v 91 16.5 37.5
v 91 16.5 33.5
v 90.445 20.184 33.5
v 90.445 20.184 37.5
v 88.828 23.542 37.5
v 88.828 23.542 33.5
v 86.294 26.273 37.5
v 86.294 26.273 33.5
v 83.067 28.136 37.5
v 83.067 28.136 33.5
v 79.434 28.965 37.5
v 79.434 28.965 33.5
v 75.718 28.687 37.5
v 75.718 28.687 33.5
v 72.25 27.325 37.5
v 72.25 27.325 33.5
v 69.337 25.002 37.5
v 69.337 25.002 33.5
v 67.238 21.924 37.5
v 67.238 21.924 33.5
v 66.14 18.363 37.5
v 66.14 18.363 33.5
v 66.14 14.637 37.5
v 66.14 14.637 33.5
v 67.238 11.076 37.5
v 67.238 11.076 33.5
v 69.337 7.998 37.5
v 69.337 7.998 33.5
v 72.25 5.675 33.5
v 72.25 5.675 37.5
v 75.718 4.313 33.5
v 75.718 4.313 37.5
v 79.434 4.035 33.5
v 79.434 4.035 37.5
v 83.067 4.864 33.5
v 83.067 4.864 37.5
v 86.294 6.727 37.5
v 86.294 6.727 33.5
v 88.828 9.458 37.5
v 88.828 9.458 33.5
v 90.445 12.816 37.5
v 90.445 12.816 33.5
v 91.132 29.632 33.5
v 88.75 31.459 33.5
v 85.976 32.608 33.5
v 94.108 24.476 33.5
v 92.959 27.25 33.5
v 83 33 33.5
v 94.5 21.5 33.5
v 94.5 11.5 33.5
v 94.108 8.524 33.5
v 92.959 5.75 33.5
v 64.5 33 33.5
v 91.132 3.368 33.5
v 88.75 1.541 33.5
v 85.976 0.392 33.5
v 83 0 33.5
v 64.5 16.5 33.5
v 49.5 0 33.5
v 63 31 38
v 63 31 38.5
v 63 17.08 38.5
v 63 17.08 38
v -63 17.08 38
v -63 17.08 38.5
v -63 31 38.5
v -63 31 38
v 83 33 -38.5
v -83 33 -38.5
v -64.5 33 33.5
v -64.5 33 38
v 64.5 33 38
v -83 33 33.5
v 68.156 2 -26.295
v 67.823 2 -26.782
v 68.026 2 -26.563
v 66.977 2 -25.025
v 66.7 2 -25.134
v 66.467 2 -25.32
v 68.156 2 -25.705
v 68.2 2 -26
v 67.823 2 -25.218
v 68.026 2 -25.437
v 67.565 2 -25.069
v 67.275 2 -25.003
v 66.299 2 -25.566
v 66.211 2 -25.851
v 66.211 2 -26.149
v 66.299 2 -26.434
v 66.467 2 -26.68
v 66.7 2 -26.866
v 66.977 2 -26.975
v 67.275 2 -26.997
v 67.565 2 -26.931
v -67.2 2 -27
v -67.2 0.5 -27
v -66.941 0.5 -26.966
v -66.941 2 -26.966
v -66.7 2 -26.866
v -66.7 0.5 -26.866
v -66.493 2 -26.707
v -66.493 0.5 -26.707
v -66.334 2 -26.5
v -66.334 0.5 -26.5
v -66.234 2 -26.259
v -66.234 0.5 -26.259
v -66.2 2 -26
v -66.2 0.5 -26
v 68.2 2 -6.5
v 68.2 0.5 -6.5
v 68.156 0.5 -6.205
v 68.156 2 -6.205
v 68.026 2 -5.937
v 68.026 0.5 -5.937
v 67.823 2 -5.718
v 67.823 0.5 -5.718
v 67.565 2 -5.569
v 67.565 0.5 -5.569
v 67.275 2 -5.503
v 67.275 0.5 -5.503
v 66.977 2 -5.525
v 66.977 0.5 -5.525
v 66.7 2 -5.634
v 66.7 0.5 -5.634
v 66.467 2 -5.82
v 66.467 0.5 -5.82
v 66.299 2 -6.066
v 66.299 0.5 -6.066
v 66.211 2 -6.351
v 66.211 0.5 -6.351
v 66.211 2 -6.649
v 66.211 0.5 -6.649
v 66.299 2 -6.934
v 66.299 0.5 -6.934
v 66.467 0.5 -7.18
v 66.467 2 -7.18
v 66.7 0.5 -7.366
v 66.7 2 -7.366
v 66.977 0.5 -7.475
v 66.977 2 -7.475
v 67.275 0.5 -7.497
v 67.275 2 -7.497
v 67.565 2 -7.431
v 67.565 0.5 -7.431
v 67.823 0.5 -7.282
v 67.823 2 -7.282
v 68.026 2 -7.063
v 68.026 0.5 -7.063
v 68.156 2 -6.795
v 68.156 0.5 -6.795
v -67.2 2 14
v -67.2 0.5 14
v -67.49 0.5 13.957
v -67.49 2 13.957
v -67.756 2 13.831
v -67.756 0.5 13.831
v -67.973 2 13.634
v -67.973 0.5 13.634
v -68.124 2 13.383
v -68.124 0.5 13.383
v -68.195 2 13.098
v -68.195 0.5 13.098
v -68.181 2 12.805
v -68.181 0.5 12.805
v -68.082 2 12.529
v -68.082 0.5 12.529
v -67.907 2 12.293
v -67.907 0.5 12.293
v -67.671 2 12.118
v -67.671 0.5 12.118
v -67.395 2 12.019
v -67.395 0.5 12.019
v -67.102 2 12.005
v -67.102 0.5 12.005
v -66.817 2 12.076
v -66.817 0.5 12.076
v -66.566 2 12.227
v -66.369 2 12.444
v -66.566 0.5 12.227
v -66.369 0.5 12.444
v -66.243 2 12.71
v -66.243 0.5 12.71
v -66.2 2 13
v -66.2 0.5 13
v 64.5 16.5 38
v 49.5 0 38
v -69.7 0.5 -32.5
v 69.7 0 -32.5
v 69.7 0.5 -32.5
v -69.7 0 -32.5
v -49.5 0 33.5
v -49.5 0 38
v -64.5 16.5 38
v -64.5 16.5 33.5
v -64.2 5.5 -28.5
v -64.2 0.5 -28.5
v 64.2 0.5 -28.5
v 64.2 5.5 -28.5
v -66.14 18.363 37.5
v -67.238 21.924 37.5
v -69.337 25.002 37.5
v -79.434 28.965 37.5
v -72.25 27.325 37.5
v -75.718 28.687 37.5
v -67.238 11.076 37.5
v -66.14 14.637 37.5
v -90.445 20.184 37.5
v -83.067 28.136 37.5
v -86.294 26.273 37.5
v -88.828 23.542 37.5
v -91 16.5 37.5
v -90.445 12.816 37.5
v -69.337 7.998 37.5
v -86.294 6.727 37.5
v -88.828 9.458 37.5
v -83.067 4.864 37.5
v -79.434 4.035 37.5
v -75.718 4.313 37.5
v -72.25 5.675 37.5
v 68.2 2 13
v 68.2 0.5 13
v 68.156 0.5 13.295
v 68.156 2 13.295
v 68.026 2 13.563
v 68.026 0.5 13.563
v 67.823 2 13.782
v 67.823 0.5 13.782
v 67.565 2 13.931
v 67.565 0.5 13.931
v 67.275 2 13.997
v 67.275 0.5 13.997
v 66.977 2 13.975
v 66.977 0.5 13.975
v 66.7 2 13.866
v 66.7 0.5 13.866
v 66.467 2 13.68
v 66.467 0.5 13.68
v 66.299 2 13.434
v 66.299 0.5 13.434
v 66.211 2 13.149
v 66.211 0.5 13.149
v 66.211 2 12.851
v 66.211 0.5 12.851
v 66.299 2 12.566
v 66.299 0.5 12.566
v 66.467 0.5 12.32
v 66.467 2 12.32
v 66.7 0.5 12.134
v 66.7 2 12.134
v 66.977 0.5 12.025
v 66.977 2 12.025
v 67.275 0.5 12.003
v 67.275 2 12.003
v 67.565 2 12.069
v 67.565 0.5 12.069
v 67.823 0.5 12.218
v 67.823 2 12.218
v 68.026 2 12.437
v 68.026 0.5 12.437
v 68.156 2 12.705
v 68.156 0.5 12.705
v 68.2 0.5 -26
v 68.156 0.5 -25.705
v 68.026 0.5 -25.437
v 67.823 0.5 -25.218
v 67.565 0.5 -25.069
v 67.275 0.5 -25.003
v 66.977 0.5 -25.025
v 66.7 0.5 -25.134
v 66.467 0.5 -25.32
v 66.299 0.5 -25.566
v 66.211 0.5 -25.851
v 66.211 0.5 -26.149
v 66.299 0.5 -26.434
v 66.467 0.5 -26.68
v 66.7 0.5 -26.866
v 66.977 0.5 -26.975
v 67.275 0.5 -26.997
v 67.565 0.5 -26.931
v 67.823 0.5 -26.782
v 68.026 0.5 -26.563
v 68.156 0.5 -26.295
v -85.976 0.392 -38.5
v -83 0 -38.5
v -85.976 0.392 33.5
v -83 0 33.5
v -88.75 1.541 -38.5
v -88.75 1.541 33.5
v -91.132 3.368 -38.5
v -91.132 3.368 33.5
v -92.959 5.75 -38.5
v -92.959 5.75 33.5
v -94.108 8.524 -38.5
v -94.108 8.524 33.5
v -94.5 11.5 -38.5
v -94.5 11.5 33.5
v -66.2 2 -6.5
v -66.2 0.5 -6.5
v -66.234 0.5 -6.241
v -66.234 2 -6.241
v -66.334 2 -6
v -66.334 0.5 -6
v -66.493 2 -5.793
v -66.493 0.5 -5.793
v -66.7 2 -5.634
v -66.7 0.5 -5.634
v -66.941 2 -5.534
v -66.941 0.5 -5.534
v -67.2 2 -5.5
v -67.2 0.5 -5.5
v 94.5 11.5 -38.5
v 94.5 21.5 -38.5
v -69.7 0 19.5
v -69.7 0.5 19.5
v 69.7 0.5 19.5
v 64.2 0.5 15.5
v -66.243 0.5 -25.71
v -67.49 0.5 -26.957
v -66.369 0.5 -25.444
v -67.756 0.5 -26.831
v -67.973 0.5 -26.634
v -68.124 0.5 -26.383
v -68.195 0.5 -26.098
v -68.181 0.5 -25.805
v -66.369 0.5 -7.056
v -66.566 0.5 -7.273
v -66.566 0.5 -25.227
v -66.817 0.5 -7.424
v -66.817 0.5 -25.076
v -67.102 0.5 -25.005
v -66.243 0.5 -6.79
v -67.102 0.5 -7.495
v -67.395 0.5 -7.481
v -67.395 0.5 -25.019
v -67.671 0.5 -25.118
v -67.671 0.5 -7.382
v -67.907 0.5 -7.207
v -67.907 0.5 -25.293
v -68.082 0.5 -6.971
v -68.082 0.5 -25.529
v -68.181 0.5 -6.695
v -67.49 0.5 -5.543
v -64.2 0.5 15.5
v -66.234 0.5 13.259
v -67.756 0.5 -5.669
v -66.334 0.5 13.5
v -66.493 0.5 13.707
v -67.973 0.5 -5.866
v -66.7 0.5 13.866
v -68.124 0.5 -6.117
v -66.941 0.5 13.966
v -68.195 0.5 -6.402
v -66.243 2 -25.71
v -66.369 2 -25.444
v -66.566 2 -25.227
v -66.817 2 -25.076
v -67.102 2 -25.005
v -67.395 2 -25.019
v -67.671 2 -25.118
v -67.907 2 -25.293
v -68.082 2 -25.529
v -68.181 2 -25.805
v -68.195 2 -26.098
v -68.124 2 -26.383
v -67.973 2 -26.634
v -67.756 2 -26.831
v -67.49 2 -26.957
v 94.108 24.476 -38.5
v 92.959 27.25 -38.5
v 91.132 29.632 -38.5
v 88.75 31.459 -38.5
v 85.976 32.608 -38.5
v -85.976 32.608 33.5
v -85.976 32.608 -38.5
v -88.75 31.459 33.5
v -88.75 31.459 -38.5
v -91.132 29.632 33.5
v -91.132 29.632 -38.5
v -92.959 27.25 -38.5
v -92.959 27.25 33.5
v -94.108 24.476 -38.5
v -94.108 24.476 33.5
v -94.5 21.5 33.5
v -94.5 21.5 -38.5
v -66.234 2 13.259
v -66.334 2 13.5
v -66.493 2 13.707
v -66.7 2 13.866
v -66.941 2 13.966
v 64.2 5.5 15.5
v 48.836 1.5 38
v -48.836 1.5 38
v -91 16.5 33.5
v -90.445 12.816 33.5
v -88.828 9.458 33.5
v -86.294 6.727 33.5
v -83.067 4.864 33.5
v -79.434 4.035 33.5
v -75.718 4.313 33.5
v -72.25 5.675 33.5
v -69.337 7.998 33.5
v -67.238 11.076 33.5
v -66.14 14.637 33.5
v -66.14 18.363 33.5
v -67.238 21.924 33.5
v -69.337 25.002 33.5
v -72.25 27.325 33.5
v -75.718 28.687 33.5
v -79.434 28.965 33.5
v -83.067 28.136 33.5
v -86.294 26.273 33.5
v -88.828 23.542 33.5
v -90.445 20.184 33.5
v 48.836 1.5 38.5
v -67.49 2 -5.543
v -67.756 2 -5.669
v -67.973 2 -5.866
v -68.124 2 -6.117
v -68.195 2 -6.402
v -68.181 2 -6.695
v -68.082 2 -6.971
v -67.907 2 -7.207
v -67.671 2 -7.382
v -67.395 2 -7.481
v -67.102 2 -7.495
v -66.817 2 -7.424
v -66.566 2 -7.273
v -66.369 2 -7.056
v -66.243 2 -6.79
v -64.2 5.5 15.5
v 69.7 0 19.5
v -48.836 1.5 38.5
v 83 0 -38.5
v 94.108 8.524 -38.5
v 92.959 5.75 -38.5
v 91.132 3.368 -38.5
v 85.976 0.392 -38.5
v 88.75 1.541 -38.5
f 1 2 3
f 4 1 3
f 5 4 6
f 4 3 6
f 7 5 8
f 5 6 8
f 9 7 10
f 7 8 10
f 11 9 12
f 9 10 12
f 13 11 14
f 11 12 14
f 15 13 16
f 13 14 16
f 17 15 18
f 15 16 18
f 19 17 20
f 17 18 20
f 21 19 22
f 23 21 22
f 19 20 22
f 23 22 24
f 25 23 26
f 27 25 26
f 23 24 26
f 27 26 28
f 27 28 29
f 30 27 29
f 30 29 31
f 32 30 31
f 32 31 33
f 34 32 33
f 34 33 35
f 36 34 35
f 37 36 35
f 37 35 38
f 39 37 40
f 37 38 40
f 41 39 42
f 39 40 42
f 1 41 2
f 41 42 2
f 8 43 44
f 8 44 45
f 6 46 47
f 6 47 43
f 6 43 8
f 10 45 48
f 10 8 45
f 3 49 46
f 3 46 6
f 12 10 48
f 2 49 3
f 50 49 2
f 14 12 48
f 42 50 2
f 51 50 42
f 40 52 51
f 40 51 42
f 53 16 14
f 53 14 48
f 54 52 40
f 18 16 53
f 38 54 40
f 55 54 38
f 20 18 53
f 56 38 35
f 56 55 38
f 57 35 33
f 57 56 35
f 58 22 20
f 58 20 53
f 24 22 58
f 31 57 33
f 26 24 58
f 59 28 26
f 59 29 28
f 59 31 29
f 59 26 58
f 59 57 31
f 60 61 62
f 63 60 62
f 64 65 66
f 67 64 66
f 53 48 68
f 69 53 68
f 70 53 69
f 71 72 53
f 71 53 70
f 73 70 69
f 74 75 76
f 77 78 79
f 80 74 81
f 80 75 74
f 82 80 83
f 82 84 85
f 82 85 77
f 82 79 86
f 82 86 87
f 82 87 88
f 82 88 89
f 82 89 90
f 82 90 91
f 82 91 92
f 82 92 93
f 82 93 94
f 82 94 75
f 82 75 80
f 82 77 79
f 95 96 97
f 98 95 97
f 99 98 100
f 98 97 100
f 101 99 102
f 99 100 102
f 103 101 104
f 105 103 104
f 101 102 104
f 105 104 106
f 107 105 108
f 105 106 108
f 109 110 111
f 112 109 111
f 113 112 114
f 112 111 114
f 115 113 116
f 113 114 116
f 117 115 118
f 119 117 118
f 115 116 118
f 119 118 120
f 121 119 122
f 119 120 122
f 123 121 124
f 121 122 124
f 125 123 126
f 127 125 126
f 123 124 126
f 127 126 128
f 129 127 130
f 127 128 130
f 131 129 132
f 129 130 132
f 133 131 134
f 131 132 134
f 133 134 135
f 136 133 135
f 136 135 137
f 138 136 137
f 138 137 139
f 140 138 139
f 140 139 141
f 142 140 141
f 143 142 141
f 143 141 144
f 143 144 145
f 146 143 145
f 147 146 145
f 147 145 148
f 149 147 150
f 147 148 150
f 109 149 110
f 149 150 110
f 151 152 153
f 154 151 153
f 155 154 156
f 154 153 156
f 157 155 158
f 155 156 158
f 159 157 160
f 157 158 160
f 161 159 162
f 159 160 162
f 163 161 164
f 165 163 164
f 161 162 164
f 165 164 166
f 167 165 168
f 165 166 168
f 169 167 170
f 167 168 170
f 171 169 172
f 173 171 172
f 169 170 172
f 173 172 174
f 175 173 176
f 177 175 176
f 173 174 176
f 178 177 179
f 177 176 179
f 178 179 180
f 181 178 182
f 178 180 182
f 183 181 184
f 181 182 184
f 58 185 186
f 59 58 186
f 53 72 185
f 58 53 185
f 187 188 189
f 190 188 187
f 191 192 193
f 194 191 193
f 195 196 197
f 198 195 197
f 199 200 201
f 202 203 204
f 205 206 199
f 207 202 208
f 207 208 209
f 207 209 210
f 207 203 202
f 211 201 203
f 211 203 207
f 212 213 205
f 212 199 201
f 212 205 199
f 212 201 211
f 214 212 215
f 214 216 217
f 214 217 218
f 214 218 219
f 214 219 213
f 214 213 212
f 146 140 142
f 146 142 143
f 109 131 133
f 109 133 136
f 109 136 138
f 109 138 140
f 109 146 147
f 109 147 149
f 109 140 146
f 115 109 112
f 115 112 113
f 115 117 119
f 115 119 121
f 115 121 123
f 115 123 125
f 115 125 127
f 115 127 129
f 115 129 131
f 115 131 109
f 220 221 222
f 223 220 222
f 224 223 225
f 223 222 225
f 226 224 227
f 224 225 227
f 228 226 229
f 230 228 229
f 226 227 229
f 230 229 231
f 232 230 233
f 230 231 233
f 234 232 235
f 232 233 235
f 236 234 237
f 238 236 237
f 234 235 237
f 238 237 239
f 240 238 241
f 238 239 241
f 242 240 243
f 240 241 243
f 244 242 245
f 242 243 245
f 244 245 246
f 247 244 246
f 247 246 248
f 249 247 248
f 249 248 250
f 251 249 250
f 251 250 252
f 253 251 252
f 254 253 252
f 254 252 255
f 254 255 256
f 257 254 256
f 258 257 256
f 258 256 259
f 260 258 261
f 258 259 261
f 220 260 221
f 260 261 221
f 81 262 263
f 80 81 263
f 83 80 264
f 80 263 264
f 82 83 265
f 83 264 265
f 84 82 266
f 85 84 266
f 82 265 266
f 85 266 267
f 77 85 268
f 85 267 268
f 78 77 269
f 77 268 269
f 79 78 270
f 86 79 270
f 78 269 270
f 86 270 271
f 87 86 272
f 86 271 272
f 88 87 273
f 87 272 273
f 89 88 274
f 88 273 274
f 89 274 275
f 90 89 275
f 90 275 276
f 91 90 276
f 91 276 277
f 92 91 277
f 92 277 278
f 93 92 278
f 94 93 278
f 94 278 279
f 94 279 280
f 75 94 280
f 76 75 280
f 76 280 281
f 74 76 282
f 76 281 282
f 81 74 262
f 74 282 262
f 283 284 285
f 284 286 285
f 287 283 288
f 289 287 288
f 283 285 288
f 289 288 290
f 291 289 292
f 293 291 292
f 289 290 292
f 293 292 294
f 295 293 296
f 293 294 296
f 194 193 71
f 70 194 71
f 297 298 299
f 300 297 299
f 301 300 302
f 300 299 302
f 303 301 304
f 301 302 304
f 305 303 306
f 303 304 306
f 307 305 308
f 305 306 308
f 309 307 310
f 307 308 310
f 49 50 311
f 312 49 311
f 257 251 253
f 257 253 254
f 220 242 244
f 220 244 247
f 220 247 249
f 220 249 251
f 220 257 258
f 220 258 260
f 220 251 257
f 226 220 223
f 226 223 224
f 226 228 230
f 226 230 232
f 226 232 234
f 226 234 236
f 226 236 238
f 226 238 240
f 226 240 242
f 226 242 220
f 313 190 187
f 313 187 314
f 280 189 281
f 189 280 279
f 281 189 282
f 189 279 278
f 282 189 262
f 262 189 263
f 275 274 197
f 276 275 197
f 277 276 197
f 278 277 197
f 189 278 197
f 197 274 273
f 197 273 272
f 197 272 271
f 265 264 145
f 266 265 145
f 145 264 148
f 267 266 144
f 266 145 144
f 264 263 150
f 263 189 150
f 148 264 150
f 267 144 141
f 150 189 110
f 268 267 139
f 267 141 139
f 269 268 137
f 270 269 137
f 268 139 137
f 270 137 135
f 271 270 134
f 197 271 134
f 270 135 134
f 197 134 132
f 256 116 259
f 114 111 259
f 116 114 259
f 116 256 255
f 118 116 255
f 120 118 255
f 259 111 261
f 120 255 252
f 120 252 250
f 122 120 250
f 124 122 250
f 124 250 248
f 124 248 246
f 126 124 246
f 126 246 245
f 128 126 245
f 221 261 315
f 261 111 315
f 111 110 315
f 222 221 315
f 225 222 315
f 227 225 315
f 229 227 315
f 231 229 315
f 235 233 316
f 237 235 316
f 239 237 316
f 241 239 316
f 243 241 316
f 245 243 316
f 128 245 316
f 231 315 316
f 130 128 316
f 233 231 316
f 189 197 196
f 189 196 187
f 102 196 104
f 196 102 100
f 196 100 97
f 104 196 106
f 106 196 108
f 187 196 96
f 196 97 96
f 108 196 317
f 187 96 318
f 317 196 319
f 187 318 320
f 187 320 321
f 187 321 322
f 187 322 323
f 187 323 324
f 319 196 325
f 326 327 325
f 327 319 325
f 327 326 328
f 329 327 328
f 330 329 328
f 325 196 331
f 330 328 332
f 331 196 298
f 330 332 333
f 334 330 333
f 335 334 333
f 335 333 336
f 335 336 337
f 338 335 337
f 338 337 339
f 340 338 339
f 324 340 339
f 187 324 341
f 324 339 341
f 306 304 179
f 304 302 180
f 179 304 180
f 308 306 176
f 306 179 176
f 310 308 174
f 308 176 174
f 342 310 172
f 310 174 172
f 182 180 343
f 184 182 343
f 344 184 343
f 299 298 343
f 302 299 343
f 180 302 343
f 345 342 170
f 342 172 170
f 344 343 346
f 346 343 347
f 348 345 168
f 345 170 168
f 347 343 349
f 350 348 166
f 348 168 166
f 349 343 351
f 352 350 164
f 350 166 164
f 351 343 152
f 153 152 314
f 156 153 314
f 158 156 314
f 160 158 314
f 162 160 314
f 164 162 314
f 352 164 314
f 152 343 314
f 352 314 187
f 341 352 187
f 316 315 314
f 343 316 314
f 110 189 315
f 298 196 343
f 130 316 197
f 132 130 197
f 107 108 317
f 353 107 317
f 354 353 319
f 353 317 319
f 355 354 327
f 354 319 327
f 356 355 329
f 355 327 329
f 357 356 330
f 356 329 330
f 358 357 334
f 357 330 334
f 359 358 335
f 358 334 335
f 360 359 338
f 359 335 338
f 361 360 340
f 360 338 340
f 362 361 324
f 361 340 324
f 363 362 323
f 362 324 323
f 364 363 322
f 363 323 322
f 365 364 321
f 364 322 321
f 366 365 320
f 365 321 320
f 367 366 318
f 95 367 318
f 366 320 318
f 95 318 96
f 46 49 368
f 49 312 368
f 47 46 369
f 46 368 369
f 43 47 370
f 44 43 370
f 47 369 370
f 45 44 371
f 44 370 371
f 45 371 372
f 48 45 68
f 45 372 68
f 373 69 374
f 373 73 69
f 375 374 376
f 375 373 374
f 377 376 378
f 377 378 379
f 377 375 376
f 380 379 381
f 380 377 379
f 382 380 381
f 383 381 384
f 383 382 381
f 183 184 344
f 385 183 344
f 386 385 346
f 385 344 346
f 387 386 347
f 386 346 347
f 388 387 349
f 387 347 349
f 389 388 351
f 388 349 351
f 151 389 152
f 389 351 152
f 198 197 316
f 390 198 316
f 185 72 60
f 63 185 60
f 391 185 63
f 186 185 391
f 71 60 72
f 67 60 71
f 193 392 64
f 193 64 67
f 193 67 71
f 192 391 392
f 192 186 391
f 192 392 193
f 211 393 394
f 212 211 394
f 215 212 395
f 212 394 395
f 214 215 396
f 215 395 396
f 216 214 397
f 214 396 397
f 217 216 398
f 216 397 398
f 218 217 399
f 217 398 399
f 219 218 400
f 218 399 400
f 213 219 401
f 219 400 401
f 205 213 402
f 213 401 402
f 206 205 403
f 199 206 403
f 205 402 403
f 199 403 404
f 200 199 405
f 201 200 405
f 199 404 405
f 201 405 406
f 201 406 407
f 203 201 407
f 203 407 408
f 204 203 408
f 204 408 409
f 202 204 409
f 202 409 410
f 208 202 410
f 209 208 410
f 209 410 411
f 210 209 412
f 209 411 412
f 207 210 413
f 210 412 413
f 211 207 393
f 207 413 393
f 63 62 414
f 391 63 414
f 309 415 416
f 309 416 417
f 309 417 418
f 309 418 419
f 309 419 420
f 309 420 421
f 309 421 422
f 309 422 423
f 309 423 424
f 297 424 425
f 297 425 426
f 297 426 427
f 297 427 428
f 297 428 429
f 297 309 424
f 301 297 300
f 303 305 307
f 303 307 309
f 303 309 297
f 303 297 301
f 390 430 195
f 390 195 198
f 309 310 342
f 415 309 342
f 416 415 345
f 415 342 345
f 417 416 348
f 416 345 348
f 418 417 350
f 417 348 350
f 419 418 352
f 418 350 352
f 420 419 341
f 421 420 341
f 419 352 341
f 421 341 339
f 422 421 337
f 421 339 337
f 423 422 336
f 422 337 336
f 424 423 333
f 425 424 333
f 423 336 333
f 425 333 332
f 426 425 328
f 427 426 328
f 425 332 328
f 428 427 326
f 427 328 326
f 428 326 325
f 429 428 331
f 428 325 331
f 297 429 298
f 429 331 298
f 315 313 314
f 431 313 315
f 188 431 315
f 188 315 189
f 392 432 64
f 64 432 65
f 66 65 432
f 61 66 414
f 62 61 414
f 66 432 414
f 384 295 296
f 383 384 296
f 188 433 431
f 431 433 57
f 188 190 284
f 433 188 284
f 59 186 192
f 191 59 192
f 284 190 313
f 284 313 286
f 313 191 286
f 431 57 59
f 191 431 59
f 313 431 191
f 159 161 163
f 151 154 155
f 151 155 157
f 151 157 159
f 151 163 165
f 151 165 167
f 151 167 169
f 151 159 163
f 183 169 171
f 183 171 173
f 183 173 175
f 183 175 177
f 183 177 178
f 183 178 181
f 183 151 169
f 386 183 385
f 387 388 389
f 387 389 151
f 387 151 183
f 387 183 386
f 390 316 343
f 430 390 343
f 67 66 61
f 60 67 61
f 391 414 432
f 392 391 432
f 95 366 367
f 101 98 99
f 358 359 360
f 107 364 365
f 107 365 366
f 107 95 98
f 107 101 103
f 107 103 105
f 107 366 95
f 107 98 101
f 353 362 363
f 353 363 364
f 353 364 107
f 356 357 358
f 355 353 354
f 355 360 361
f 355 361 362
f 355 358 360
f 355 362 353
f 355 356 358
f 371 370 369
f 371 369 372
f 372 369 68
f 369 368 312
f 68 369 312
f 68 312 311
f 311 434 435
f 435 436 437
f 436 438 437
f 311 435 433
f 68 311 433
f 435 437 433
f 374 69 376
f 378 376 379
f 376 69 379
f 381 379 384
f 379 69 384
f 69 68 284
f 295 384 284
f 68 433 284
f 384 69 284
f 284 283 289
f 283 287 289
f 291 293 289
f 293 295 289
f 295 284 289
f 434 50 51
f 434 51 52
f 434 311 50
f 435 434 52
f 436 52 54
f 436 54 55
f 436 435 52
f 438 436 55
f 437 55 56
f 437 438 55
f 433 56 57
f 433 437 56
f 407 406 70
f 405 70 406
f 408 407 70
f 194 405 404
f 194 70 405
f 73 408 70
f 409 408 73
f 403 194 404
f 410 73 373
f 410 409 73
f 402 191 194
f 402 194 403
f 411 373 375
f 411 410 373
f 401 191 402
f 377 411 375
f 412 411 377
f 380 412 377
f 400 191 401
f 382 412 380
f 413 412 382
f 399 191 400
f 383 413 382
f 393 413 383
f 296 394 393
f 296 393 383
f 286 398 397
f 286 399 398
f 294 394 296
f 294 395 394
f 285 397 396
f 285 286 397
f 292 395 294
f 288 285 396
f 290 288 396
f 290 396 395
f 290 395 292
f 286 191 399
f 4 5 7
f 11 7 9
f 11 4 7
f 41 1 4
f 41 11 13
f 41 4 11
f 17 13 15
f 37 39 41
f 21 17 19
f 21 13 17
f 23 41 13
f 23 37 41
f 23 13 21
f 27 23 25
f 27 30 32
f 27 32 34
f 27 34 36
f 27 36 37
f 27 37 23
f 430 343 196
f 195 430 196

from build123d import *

# Parameters (mm, degrees)
F1_DEPTH  = 33
F3_DEPTH  = 5
F4_R      = 12.5
F5_DEPTH  = 4
F7_DEPTH  = 0.5
F8_R      = 11.5
F9_R      = 11.5
F11_DEPTH = 0.5
F13_DEPTH = 5
F12_R     = 1
F14_DEPTH = 1.5
F15_ANGLE = 180


with BuildPart() as f1:
    # F0 (on Front) → F1 (new body)
    with BuildSketch(Plane.XZ):
        Polygon((64.5, 38.5), (0, 38.5), (-64.5, 38.5), (-94.5, 38.5), (-94.5, 0), (-94.5, -38.5), (0, -38.5), (94.5, -38.5), (94.5, 0), (94.5, 38.5), align=None)
    extrude(amount=F1_DEPTH)

    # F2 (on face) → F3 (cut)
    with BuildSketch(Plane.XY.offset(38.5)):
        Polygon((-64.5, 0), (-94.5, 0), (-94.5, -16.5), (-94.5, -33), (-64.5, -33), (-64.5, -16.5), (-49.5, 0), align=None)
        Polygon((49.5, 0), (64.5, -16.5), (64.5, -33), (94.5, -33), (94.5, 0), (64.5, 0), align=None)
    extrude(amount=-F3_DEPTH, mode=Mode.SUBTRACT)

    # F4 (on face) → F5 (join)
    with BuildSketch(Plane.XY.offset(33.5)):
        with BuildLine():
            ThreePointArc((-66, -16.5), (-78.5, -4), (-91, -16.5))
            ThreePointArc((-91, -16.5), (-78.5, -29), (-66, -16.5))
        make_face()
        with Locations((78.5, -16.5)):
            Circle(F4_R)
    extrude(amount=F5_DEPTH)

    # F6 (on face) → F7 (cut)
    with BuildSketch(Plane.XY.offset(38.5)):
        Polygon((0, -1.5), (0, 0), (-49.5, 0), (-64.5, -16.5), (-64.5, -33), (0, -33), (0, -31), (-63, -31), (-63, -17.0799103121), (-48.8364451708, -1.5), align=None)
        Polygon((49.5, 0), (0, 0), (0, -1.5), (48.8364451708, -1.5), (63, -17.0799103121), (63, -31), (0, -31), (0, -33), (64.5, -33), (64.5, -16.5), align=None)
    extrude(amount=-F7_DEPTH, mode=Mode.SUBTRACT)

    # F8
    f8_edges = [f1.edges().sort_by_distance(p)[0] for p in [
        (-94.5, -33, -2.5),
    ]]
    fillet(f8_edges, radius=F8_R)

    # F9
    f9_edges = [f1.edges().sort_by_distance(p)[0] for p in [
        (-94.5, 0, -2.5),
        (94.5, 0, -2.5),
        (94.5, -33, -2.5),
    ]]
    fillet(f9_edges, radius=F9_R)

    # F10 (on Front) → F11 (cut)
    with BuildSketch(Plane.XZ):
        Polygon((69.7, -32.5), (69.7, 0), (69.7, 19.5), (0, 19.5), (-69.7, 19.5), (-69.7, 0), (-69.7, -32.5), (0, -32.5), align=None)
    extrude(amount=F11_DEPTH, mode=Mode.SUBTRACT)

    # F12 (on face) → F13 (cut)
    with BuildSketch(Plane(origin=(0, -0.5, 0), x_dir=(-1, 0, 0), z_dir=(0, 1, 0))):
        Polygon((-64.2, 15.5), (-64.2, 0), (-64.2, -28.5), (-48.5950261354, -28.5), (64.2, -28.5), (64.2, 15.5), (-38.0094833672, 15.5), align=None)
    extrude(amount=-F13_DEPTH, mode=Mode.SUBTRACT)

    # F12 (on face) → F14 (cut)
    with BuildSketch(Plane(origin=(0, -0.5, 0), x_dir=(-1, 0, 0), z_dir=(0, 1, 0))):
        with BuildLine():
            ThreePointArc((-66.2, 13), (-66.4928932188, 13.7071067812), (-67.2, 14))
            ThreePointArc((-67.2, 14), (-67.9071067812, 12.2928932188), (-66.2, 13))
        make_face()
        with BuildLine():
            ThreePointArc((-66.2, -6.5), (-66.4928932188, -5.7928932188), (-67.2, -5.5))
            ThreePointArc((-67.2, -5.5), (-67.9071067812, -7.2071067812), (-66.2, -6.5))
        make_face()
        with Locations((67.2, -26)):
            Circle(F12_R)
        with Locations((67.2, -6.5)):
            Circle(F12_R)
        with Locations((67.2, 13)):
            Circle(F12_R)
        with BuildLine():
            ThreePointArc((-66.2, -26), (-67.9071067812, -25.2928932188), (-67.2, -27))
            ThreePointArc((-67.2, -27), (-66.4928932188, -26.7071067812), (-66.2, -26))
        make_face()
    extrude(amount=-F14_DEPTH, mode=Mode.SUBTRACT)


with BuildPart() as f1_1:
    # F15: moved
    add(f1.part.rotate(Axis((83, 0, -2.5), (0, 0, 1)), F15_ANGLE))


with BuildPart() as f1_2:
    # F16: moved
    add(f1_1.part.moved(Location((-166, 0, 0))))


solid = f1_2.part
